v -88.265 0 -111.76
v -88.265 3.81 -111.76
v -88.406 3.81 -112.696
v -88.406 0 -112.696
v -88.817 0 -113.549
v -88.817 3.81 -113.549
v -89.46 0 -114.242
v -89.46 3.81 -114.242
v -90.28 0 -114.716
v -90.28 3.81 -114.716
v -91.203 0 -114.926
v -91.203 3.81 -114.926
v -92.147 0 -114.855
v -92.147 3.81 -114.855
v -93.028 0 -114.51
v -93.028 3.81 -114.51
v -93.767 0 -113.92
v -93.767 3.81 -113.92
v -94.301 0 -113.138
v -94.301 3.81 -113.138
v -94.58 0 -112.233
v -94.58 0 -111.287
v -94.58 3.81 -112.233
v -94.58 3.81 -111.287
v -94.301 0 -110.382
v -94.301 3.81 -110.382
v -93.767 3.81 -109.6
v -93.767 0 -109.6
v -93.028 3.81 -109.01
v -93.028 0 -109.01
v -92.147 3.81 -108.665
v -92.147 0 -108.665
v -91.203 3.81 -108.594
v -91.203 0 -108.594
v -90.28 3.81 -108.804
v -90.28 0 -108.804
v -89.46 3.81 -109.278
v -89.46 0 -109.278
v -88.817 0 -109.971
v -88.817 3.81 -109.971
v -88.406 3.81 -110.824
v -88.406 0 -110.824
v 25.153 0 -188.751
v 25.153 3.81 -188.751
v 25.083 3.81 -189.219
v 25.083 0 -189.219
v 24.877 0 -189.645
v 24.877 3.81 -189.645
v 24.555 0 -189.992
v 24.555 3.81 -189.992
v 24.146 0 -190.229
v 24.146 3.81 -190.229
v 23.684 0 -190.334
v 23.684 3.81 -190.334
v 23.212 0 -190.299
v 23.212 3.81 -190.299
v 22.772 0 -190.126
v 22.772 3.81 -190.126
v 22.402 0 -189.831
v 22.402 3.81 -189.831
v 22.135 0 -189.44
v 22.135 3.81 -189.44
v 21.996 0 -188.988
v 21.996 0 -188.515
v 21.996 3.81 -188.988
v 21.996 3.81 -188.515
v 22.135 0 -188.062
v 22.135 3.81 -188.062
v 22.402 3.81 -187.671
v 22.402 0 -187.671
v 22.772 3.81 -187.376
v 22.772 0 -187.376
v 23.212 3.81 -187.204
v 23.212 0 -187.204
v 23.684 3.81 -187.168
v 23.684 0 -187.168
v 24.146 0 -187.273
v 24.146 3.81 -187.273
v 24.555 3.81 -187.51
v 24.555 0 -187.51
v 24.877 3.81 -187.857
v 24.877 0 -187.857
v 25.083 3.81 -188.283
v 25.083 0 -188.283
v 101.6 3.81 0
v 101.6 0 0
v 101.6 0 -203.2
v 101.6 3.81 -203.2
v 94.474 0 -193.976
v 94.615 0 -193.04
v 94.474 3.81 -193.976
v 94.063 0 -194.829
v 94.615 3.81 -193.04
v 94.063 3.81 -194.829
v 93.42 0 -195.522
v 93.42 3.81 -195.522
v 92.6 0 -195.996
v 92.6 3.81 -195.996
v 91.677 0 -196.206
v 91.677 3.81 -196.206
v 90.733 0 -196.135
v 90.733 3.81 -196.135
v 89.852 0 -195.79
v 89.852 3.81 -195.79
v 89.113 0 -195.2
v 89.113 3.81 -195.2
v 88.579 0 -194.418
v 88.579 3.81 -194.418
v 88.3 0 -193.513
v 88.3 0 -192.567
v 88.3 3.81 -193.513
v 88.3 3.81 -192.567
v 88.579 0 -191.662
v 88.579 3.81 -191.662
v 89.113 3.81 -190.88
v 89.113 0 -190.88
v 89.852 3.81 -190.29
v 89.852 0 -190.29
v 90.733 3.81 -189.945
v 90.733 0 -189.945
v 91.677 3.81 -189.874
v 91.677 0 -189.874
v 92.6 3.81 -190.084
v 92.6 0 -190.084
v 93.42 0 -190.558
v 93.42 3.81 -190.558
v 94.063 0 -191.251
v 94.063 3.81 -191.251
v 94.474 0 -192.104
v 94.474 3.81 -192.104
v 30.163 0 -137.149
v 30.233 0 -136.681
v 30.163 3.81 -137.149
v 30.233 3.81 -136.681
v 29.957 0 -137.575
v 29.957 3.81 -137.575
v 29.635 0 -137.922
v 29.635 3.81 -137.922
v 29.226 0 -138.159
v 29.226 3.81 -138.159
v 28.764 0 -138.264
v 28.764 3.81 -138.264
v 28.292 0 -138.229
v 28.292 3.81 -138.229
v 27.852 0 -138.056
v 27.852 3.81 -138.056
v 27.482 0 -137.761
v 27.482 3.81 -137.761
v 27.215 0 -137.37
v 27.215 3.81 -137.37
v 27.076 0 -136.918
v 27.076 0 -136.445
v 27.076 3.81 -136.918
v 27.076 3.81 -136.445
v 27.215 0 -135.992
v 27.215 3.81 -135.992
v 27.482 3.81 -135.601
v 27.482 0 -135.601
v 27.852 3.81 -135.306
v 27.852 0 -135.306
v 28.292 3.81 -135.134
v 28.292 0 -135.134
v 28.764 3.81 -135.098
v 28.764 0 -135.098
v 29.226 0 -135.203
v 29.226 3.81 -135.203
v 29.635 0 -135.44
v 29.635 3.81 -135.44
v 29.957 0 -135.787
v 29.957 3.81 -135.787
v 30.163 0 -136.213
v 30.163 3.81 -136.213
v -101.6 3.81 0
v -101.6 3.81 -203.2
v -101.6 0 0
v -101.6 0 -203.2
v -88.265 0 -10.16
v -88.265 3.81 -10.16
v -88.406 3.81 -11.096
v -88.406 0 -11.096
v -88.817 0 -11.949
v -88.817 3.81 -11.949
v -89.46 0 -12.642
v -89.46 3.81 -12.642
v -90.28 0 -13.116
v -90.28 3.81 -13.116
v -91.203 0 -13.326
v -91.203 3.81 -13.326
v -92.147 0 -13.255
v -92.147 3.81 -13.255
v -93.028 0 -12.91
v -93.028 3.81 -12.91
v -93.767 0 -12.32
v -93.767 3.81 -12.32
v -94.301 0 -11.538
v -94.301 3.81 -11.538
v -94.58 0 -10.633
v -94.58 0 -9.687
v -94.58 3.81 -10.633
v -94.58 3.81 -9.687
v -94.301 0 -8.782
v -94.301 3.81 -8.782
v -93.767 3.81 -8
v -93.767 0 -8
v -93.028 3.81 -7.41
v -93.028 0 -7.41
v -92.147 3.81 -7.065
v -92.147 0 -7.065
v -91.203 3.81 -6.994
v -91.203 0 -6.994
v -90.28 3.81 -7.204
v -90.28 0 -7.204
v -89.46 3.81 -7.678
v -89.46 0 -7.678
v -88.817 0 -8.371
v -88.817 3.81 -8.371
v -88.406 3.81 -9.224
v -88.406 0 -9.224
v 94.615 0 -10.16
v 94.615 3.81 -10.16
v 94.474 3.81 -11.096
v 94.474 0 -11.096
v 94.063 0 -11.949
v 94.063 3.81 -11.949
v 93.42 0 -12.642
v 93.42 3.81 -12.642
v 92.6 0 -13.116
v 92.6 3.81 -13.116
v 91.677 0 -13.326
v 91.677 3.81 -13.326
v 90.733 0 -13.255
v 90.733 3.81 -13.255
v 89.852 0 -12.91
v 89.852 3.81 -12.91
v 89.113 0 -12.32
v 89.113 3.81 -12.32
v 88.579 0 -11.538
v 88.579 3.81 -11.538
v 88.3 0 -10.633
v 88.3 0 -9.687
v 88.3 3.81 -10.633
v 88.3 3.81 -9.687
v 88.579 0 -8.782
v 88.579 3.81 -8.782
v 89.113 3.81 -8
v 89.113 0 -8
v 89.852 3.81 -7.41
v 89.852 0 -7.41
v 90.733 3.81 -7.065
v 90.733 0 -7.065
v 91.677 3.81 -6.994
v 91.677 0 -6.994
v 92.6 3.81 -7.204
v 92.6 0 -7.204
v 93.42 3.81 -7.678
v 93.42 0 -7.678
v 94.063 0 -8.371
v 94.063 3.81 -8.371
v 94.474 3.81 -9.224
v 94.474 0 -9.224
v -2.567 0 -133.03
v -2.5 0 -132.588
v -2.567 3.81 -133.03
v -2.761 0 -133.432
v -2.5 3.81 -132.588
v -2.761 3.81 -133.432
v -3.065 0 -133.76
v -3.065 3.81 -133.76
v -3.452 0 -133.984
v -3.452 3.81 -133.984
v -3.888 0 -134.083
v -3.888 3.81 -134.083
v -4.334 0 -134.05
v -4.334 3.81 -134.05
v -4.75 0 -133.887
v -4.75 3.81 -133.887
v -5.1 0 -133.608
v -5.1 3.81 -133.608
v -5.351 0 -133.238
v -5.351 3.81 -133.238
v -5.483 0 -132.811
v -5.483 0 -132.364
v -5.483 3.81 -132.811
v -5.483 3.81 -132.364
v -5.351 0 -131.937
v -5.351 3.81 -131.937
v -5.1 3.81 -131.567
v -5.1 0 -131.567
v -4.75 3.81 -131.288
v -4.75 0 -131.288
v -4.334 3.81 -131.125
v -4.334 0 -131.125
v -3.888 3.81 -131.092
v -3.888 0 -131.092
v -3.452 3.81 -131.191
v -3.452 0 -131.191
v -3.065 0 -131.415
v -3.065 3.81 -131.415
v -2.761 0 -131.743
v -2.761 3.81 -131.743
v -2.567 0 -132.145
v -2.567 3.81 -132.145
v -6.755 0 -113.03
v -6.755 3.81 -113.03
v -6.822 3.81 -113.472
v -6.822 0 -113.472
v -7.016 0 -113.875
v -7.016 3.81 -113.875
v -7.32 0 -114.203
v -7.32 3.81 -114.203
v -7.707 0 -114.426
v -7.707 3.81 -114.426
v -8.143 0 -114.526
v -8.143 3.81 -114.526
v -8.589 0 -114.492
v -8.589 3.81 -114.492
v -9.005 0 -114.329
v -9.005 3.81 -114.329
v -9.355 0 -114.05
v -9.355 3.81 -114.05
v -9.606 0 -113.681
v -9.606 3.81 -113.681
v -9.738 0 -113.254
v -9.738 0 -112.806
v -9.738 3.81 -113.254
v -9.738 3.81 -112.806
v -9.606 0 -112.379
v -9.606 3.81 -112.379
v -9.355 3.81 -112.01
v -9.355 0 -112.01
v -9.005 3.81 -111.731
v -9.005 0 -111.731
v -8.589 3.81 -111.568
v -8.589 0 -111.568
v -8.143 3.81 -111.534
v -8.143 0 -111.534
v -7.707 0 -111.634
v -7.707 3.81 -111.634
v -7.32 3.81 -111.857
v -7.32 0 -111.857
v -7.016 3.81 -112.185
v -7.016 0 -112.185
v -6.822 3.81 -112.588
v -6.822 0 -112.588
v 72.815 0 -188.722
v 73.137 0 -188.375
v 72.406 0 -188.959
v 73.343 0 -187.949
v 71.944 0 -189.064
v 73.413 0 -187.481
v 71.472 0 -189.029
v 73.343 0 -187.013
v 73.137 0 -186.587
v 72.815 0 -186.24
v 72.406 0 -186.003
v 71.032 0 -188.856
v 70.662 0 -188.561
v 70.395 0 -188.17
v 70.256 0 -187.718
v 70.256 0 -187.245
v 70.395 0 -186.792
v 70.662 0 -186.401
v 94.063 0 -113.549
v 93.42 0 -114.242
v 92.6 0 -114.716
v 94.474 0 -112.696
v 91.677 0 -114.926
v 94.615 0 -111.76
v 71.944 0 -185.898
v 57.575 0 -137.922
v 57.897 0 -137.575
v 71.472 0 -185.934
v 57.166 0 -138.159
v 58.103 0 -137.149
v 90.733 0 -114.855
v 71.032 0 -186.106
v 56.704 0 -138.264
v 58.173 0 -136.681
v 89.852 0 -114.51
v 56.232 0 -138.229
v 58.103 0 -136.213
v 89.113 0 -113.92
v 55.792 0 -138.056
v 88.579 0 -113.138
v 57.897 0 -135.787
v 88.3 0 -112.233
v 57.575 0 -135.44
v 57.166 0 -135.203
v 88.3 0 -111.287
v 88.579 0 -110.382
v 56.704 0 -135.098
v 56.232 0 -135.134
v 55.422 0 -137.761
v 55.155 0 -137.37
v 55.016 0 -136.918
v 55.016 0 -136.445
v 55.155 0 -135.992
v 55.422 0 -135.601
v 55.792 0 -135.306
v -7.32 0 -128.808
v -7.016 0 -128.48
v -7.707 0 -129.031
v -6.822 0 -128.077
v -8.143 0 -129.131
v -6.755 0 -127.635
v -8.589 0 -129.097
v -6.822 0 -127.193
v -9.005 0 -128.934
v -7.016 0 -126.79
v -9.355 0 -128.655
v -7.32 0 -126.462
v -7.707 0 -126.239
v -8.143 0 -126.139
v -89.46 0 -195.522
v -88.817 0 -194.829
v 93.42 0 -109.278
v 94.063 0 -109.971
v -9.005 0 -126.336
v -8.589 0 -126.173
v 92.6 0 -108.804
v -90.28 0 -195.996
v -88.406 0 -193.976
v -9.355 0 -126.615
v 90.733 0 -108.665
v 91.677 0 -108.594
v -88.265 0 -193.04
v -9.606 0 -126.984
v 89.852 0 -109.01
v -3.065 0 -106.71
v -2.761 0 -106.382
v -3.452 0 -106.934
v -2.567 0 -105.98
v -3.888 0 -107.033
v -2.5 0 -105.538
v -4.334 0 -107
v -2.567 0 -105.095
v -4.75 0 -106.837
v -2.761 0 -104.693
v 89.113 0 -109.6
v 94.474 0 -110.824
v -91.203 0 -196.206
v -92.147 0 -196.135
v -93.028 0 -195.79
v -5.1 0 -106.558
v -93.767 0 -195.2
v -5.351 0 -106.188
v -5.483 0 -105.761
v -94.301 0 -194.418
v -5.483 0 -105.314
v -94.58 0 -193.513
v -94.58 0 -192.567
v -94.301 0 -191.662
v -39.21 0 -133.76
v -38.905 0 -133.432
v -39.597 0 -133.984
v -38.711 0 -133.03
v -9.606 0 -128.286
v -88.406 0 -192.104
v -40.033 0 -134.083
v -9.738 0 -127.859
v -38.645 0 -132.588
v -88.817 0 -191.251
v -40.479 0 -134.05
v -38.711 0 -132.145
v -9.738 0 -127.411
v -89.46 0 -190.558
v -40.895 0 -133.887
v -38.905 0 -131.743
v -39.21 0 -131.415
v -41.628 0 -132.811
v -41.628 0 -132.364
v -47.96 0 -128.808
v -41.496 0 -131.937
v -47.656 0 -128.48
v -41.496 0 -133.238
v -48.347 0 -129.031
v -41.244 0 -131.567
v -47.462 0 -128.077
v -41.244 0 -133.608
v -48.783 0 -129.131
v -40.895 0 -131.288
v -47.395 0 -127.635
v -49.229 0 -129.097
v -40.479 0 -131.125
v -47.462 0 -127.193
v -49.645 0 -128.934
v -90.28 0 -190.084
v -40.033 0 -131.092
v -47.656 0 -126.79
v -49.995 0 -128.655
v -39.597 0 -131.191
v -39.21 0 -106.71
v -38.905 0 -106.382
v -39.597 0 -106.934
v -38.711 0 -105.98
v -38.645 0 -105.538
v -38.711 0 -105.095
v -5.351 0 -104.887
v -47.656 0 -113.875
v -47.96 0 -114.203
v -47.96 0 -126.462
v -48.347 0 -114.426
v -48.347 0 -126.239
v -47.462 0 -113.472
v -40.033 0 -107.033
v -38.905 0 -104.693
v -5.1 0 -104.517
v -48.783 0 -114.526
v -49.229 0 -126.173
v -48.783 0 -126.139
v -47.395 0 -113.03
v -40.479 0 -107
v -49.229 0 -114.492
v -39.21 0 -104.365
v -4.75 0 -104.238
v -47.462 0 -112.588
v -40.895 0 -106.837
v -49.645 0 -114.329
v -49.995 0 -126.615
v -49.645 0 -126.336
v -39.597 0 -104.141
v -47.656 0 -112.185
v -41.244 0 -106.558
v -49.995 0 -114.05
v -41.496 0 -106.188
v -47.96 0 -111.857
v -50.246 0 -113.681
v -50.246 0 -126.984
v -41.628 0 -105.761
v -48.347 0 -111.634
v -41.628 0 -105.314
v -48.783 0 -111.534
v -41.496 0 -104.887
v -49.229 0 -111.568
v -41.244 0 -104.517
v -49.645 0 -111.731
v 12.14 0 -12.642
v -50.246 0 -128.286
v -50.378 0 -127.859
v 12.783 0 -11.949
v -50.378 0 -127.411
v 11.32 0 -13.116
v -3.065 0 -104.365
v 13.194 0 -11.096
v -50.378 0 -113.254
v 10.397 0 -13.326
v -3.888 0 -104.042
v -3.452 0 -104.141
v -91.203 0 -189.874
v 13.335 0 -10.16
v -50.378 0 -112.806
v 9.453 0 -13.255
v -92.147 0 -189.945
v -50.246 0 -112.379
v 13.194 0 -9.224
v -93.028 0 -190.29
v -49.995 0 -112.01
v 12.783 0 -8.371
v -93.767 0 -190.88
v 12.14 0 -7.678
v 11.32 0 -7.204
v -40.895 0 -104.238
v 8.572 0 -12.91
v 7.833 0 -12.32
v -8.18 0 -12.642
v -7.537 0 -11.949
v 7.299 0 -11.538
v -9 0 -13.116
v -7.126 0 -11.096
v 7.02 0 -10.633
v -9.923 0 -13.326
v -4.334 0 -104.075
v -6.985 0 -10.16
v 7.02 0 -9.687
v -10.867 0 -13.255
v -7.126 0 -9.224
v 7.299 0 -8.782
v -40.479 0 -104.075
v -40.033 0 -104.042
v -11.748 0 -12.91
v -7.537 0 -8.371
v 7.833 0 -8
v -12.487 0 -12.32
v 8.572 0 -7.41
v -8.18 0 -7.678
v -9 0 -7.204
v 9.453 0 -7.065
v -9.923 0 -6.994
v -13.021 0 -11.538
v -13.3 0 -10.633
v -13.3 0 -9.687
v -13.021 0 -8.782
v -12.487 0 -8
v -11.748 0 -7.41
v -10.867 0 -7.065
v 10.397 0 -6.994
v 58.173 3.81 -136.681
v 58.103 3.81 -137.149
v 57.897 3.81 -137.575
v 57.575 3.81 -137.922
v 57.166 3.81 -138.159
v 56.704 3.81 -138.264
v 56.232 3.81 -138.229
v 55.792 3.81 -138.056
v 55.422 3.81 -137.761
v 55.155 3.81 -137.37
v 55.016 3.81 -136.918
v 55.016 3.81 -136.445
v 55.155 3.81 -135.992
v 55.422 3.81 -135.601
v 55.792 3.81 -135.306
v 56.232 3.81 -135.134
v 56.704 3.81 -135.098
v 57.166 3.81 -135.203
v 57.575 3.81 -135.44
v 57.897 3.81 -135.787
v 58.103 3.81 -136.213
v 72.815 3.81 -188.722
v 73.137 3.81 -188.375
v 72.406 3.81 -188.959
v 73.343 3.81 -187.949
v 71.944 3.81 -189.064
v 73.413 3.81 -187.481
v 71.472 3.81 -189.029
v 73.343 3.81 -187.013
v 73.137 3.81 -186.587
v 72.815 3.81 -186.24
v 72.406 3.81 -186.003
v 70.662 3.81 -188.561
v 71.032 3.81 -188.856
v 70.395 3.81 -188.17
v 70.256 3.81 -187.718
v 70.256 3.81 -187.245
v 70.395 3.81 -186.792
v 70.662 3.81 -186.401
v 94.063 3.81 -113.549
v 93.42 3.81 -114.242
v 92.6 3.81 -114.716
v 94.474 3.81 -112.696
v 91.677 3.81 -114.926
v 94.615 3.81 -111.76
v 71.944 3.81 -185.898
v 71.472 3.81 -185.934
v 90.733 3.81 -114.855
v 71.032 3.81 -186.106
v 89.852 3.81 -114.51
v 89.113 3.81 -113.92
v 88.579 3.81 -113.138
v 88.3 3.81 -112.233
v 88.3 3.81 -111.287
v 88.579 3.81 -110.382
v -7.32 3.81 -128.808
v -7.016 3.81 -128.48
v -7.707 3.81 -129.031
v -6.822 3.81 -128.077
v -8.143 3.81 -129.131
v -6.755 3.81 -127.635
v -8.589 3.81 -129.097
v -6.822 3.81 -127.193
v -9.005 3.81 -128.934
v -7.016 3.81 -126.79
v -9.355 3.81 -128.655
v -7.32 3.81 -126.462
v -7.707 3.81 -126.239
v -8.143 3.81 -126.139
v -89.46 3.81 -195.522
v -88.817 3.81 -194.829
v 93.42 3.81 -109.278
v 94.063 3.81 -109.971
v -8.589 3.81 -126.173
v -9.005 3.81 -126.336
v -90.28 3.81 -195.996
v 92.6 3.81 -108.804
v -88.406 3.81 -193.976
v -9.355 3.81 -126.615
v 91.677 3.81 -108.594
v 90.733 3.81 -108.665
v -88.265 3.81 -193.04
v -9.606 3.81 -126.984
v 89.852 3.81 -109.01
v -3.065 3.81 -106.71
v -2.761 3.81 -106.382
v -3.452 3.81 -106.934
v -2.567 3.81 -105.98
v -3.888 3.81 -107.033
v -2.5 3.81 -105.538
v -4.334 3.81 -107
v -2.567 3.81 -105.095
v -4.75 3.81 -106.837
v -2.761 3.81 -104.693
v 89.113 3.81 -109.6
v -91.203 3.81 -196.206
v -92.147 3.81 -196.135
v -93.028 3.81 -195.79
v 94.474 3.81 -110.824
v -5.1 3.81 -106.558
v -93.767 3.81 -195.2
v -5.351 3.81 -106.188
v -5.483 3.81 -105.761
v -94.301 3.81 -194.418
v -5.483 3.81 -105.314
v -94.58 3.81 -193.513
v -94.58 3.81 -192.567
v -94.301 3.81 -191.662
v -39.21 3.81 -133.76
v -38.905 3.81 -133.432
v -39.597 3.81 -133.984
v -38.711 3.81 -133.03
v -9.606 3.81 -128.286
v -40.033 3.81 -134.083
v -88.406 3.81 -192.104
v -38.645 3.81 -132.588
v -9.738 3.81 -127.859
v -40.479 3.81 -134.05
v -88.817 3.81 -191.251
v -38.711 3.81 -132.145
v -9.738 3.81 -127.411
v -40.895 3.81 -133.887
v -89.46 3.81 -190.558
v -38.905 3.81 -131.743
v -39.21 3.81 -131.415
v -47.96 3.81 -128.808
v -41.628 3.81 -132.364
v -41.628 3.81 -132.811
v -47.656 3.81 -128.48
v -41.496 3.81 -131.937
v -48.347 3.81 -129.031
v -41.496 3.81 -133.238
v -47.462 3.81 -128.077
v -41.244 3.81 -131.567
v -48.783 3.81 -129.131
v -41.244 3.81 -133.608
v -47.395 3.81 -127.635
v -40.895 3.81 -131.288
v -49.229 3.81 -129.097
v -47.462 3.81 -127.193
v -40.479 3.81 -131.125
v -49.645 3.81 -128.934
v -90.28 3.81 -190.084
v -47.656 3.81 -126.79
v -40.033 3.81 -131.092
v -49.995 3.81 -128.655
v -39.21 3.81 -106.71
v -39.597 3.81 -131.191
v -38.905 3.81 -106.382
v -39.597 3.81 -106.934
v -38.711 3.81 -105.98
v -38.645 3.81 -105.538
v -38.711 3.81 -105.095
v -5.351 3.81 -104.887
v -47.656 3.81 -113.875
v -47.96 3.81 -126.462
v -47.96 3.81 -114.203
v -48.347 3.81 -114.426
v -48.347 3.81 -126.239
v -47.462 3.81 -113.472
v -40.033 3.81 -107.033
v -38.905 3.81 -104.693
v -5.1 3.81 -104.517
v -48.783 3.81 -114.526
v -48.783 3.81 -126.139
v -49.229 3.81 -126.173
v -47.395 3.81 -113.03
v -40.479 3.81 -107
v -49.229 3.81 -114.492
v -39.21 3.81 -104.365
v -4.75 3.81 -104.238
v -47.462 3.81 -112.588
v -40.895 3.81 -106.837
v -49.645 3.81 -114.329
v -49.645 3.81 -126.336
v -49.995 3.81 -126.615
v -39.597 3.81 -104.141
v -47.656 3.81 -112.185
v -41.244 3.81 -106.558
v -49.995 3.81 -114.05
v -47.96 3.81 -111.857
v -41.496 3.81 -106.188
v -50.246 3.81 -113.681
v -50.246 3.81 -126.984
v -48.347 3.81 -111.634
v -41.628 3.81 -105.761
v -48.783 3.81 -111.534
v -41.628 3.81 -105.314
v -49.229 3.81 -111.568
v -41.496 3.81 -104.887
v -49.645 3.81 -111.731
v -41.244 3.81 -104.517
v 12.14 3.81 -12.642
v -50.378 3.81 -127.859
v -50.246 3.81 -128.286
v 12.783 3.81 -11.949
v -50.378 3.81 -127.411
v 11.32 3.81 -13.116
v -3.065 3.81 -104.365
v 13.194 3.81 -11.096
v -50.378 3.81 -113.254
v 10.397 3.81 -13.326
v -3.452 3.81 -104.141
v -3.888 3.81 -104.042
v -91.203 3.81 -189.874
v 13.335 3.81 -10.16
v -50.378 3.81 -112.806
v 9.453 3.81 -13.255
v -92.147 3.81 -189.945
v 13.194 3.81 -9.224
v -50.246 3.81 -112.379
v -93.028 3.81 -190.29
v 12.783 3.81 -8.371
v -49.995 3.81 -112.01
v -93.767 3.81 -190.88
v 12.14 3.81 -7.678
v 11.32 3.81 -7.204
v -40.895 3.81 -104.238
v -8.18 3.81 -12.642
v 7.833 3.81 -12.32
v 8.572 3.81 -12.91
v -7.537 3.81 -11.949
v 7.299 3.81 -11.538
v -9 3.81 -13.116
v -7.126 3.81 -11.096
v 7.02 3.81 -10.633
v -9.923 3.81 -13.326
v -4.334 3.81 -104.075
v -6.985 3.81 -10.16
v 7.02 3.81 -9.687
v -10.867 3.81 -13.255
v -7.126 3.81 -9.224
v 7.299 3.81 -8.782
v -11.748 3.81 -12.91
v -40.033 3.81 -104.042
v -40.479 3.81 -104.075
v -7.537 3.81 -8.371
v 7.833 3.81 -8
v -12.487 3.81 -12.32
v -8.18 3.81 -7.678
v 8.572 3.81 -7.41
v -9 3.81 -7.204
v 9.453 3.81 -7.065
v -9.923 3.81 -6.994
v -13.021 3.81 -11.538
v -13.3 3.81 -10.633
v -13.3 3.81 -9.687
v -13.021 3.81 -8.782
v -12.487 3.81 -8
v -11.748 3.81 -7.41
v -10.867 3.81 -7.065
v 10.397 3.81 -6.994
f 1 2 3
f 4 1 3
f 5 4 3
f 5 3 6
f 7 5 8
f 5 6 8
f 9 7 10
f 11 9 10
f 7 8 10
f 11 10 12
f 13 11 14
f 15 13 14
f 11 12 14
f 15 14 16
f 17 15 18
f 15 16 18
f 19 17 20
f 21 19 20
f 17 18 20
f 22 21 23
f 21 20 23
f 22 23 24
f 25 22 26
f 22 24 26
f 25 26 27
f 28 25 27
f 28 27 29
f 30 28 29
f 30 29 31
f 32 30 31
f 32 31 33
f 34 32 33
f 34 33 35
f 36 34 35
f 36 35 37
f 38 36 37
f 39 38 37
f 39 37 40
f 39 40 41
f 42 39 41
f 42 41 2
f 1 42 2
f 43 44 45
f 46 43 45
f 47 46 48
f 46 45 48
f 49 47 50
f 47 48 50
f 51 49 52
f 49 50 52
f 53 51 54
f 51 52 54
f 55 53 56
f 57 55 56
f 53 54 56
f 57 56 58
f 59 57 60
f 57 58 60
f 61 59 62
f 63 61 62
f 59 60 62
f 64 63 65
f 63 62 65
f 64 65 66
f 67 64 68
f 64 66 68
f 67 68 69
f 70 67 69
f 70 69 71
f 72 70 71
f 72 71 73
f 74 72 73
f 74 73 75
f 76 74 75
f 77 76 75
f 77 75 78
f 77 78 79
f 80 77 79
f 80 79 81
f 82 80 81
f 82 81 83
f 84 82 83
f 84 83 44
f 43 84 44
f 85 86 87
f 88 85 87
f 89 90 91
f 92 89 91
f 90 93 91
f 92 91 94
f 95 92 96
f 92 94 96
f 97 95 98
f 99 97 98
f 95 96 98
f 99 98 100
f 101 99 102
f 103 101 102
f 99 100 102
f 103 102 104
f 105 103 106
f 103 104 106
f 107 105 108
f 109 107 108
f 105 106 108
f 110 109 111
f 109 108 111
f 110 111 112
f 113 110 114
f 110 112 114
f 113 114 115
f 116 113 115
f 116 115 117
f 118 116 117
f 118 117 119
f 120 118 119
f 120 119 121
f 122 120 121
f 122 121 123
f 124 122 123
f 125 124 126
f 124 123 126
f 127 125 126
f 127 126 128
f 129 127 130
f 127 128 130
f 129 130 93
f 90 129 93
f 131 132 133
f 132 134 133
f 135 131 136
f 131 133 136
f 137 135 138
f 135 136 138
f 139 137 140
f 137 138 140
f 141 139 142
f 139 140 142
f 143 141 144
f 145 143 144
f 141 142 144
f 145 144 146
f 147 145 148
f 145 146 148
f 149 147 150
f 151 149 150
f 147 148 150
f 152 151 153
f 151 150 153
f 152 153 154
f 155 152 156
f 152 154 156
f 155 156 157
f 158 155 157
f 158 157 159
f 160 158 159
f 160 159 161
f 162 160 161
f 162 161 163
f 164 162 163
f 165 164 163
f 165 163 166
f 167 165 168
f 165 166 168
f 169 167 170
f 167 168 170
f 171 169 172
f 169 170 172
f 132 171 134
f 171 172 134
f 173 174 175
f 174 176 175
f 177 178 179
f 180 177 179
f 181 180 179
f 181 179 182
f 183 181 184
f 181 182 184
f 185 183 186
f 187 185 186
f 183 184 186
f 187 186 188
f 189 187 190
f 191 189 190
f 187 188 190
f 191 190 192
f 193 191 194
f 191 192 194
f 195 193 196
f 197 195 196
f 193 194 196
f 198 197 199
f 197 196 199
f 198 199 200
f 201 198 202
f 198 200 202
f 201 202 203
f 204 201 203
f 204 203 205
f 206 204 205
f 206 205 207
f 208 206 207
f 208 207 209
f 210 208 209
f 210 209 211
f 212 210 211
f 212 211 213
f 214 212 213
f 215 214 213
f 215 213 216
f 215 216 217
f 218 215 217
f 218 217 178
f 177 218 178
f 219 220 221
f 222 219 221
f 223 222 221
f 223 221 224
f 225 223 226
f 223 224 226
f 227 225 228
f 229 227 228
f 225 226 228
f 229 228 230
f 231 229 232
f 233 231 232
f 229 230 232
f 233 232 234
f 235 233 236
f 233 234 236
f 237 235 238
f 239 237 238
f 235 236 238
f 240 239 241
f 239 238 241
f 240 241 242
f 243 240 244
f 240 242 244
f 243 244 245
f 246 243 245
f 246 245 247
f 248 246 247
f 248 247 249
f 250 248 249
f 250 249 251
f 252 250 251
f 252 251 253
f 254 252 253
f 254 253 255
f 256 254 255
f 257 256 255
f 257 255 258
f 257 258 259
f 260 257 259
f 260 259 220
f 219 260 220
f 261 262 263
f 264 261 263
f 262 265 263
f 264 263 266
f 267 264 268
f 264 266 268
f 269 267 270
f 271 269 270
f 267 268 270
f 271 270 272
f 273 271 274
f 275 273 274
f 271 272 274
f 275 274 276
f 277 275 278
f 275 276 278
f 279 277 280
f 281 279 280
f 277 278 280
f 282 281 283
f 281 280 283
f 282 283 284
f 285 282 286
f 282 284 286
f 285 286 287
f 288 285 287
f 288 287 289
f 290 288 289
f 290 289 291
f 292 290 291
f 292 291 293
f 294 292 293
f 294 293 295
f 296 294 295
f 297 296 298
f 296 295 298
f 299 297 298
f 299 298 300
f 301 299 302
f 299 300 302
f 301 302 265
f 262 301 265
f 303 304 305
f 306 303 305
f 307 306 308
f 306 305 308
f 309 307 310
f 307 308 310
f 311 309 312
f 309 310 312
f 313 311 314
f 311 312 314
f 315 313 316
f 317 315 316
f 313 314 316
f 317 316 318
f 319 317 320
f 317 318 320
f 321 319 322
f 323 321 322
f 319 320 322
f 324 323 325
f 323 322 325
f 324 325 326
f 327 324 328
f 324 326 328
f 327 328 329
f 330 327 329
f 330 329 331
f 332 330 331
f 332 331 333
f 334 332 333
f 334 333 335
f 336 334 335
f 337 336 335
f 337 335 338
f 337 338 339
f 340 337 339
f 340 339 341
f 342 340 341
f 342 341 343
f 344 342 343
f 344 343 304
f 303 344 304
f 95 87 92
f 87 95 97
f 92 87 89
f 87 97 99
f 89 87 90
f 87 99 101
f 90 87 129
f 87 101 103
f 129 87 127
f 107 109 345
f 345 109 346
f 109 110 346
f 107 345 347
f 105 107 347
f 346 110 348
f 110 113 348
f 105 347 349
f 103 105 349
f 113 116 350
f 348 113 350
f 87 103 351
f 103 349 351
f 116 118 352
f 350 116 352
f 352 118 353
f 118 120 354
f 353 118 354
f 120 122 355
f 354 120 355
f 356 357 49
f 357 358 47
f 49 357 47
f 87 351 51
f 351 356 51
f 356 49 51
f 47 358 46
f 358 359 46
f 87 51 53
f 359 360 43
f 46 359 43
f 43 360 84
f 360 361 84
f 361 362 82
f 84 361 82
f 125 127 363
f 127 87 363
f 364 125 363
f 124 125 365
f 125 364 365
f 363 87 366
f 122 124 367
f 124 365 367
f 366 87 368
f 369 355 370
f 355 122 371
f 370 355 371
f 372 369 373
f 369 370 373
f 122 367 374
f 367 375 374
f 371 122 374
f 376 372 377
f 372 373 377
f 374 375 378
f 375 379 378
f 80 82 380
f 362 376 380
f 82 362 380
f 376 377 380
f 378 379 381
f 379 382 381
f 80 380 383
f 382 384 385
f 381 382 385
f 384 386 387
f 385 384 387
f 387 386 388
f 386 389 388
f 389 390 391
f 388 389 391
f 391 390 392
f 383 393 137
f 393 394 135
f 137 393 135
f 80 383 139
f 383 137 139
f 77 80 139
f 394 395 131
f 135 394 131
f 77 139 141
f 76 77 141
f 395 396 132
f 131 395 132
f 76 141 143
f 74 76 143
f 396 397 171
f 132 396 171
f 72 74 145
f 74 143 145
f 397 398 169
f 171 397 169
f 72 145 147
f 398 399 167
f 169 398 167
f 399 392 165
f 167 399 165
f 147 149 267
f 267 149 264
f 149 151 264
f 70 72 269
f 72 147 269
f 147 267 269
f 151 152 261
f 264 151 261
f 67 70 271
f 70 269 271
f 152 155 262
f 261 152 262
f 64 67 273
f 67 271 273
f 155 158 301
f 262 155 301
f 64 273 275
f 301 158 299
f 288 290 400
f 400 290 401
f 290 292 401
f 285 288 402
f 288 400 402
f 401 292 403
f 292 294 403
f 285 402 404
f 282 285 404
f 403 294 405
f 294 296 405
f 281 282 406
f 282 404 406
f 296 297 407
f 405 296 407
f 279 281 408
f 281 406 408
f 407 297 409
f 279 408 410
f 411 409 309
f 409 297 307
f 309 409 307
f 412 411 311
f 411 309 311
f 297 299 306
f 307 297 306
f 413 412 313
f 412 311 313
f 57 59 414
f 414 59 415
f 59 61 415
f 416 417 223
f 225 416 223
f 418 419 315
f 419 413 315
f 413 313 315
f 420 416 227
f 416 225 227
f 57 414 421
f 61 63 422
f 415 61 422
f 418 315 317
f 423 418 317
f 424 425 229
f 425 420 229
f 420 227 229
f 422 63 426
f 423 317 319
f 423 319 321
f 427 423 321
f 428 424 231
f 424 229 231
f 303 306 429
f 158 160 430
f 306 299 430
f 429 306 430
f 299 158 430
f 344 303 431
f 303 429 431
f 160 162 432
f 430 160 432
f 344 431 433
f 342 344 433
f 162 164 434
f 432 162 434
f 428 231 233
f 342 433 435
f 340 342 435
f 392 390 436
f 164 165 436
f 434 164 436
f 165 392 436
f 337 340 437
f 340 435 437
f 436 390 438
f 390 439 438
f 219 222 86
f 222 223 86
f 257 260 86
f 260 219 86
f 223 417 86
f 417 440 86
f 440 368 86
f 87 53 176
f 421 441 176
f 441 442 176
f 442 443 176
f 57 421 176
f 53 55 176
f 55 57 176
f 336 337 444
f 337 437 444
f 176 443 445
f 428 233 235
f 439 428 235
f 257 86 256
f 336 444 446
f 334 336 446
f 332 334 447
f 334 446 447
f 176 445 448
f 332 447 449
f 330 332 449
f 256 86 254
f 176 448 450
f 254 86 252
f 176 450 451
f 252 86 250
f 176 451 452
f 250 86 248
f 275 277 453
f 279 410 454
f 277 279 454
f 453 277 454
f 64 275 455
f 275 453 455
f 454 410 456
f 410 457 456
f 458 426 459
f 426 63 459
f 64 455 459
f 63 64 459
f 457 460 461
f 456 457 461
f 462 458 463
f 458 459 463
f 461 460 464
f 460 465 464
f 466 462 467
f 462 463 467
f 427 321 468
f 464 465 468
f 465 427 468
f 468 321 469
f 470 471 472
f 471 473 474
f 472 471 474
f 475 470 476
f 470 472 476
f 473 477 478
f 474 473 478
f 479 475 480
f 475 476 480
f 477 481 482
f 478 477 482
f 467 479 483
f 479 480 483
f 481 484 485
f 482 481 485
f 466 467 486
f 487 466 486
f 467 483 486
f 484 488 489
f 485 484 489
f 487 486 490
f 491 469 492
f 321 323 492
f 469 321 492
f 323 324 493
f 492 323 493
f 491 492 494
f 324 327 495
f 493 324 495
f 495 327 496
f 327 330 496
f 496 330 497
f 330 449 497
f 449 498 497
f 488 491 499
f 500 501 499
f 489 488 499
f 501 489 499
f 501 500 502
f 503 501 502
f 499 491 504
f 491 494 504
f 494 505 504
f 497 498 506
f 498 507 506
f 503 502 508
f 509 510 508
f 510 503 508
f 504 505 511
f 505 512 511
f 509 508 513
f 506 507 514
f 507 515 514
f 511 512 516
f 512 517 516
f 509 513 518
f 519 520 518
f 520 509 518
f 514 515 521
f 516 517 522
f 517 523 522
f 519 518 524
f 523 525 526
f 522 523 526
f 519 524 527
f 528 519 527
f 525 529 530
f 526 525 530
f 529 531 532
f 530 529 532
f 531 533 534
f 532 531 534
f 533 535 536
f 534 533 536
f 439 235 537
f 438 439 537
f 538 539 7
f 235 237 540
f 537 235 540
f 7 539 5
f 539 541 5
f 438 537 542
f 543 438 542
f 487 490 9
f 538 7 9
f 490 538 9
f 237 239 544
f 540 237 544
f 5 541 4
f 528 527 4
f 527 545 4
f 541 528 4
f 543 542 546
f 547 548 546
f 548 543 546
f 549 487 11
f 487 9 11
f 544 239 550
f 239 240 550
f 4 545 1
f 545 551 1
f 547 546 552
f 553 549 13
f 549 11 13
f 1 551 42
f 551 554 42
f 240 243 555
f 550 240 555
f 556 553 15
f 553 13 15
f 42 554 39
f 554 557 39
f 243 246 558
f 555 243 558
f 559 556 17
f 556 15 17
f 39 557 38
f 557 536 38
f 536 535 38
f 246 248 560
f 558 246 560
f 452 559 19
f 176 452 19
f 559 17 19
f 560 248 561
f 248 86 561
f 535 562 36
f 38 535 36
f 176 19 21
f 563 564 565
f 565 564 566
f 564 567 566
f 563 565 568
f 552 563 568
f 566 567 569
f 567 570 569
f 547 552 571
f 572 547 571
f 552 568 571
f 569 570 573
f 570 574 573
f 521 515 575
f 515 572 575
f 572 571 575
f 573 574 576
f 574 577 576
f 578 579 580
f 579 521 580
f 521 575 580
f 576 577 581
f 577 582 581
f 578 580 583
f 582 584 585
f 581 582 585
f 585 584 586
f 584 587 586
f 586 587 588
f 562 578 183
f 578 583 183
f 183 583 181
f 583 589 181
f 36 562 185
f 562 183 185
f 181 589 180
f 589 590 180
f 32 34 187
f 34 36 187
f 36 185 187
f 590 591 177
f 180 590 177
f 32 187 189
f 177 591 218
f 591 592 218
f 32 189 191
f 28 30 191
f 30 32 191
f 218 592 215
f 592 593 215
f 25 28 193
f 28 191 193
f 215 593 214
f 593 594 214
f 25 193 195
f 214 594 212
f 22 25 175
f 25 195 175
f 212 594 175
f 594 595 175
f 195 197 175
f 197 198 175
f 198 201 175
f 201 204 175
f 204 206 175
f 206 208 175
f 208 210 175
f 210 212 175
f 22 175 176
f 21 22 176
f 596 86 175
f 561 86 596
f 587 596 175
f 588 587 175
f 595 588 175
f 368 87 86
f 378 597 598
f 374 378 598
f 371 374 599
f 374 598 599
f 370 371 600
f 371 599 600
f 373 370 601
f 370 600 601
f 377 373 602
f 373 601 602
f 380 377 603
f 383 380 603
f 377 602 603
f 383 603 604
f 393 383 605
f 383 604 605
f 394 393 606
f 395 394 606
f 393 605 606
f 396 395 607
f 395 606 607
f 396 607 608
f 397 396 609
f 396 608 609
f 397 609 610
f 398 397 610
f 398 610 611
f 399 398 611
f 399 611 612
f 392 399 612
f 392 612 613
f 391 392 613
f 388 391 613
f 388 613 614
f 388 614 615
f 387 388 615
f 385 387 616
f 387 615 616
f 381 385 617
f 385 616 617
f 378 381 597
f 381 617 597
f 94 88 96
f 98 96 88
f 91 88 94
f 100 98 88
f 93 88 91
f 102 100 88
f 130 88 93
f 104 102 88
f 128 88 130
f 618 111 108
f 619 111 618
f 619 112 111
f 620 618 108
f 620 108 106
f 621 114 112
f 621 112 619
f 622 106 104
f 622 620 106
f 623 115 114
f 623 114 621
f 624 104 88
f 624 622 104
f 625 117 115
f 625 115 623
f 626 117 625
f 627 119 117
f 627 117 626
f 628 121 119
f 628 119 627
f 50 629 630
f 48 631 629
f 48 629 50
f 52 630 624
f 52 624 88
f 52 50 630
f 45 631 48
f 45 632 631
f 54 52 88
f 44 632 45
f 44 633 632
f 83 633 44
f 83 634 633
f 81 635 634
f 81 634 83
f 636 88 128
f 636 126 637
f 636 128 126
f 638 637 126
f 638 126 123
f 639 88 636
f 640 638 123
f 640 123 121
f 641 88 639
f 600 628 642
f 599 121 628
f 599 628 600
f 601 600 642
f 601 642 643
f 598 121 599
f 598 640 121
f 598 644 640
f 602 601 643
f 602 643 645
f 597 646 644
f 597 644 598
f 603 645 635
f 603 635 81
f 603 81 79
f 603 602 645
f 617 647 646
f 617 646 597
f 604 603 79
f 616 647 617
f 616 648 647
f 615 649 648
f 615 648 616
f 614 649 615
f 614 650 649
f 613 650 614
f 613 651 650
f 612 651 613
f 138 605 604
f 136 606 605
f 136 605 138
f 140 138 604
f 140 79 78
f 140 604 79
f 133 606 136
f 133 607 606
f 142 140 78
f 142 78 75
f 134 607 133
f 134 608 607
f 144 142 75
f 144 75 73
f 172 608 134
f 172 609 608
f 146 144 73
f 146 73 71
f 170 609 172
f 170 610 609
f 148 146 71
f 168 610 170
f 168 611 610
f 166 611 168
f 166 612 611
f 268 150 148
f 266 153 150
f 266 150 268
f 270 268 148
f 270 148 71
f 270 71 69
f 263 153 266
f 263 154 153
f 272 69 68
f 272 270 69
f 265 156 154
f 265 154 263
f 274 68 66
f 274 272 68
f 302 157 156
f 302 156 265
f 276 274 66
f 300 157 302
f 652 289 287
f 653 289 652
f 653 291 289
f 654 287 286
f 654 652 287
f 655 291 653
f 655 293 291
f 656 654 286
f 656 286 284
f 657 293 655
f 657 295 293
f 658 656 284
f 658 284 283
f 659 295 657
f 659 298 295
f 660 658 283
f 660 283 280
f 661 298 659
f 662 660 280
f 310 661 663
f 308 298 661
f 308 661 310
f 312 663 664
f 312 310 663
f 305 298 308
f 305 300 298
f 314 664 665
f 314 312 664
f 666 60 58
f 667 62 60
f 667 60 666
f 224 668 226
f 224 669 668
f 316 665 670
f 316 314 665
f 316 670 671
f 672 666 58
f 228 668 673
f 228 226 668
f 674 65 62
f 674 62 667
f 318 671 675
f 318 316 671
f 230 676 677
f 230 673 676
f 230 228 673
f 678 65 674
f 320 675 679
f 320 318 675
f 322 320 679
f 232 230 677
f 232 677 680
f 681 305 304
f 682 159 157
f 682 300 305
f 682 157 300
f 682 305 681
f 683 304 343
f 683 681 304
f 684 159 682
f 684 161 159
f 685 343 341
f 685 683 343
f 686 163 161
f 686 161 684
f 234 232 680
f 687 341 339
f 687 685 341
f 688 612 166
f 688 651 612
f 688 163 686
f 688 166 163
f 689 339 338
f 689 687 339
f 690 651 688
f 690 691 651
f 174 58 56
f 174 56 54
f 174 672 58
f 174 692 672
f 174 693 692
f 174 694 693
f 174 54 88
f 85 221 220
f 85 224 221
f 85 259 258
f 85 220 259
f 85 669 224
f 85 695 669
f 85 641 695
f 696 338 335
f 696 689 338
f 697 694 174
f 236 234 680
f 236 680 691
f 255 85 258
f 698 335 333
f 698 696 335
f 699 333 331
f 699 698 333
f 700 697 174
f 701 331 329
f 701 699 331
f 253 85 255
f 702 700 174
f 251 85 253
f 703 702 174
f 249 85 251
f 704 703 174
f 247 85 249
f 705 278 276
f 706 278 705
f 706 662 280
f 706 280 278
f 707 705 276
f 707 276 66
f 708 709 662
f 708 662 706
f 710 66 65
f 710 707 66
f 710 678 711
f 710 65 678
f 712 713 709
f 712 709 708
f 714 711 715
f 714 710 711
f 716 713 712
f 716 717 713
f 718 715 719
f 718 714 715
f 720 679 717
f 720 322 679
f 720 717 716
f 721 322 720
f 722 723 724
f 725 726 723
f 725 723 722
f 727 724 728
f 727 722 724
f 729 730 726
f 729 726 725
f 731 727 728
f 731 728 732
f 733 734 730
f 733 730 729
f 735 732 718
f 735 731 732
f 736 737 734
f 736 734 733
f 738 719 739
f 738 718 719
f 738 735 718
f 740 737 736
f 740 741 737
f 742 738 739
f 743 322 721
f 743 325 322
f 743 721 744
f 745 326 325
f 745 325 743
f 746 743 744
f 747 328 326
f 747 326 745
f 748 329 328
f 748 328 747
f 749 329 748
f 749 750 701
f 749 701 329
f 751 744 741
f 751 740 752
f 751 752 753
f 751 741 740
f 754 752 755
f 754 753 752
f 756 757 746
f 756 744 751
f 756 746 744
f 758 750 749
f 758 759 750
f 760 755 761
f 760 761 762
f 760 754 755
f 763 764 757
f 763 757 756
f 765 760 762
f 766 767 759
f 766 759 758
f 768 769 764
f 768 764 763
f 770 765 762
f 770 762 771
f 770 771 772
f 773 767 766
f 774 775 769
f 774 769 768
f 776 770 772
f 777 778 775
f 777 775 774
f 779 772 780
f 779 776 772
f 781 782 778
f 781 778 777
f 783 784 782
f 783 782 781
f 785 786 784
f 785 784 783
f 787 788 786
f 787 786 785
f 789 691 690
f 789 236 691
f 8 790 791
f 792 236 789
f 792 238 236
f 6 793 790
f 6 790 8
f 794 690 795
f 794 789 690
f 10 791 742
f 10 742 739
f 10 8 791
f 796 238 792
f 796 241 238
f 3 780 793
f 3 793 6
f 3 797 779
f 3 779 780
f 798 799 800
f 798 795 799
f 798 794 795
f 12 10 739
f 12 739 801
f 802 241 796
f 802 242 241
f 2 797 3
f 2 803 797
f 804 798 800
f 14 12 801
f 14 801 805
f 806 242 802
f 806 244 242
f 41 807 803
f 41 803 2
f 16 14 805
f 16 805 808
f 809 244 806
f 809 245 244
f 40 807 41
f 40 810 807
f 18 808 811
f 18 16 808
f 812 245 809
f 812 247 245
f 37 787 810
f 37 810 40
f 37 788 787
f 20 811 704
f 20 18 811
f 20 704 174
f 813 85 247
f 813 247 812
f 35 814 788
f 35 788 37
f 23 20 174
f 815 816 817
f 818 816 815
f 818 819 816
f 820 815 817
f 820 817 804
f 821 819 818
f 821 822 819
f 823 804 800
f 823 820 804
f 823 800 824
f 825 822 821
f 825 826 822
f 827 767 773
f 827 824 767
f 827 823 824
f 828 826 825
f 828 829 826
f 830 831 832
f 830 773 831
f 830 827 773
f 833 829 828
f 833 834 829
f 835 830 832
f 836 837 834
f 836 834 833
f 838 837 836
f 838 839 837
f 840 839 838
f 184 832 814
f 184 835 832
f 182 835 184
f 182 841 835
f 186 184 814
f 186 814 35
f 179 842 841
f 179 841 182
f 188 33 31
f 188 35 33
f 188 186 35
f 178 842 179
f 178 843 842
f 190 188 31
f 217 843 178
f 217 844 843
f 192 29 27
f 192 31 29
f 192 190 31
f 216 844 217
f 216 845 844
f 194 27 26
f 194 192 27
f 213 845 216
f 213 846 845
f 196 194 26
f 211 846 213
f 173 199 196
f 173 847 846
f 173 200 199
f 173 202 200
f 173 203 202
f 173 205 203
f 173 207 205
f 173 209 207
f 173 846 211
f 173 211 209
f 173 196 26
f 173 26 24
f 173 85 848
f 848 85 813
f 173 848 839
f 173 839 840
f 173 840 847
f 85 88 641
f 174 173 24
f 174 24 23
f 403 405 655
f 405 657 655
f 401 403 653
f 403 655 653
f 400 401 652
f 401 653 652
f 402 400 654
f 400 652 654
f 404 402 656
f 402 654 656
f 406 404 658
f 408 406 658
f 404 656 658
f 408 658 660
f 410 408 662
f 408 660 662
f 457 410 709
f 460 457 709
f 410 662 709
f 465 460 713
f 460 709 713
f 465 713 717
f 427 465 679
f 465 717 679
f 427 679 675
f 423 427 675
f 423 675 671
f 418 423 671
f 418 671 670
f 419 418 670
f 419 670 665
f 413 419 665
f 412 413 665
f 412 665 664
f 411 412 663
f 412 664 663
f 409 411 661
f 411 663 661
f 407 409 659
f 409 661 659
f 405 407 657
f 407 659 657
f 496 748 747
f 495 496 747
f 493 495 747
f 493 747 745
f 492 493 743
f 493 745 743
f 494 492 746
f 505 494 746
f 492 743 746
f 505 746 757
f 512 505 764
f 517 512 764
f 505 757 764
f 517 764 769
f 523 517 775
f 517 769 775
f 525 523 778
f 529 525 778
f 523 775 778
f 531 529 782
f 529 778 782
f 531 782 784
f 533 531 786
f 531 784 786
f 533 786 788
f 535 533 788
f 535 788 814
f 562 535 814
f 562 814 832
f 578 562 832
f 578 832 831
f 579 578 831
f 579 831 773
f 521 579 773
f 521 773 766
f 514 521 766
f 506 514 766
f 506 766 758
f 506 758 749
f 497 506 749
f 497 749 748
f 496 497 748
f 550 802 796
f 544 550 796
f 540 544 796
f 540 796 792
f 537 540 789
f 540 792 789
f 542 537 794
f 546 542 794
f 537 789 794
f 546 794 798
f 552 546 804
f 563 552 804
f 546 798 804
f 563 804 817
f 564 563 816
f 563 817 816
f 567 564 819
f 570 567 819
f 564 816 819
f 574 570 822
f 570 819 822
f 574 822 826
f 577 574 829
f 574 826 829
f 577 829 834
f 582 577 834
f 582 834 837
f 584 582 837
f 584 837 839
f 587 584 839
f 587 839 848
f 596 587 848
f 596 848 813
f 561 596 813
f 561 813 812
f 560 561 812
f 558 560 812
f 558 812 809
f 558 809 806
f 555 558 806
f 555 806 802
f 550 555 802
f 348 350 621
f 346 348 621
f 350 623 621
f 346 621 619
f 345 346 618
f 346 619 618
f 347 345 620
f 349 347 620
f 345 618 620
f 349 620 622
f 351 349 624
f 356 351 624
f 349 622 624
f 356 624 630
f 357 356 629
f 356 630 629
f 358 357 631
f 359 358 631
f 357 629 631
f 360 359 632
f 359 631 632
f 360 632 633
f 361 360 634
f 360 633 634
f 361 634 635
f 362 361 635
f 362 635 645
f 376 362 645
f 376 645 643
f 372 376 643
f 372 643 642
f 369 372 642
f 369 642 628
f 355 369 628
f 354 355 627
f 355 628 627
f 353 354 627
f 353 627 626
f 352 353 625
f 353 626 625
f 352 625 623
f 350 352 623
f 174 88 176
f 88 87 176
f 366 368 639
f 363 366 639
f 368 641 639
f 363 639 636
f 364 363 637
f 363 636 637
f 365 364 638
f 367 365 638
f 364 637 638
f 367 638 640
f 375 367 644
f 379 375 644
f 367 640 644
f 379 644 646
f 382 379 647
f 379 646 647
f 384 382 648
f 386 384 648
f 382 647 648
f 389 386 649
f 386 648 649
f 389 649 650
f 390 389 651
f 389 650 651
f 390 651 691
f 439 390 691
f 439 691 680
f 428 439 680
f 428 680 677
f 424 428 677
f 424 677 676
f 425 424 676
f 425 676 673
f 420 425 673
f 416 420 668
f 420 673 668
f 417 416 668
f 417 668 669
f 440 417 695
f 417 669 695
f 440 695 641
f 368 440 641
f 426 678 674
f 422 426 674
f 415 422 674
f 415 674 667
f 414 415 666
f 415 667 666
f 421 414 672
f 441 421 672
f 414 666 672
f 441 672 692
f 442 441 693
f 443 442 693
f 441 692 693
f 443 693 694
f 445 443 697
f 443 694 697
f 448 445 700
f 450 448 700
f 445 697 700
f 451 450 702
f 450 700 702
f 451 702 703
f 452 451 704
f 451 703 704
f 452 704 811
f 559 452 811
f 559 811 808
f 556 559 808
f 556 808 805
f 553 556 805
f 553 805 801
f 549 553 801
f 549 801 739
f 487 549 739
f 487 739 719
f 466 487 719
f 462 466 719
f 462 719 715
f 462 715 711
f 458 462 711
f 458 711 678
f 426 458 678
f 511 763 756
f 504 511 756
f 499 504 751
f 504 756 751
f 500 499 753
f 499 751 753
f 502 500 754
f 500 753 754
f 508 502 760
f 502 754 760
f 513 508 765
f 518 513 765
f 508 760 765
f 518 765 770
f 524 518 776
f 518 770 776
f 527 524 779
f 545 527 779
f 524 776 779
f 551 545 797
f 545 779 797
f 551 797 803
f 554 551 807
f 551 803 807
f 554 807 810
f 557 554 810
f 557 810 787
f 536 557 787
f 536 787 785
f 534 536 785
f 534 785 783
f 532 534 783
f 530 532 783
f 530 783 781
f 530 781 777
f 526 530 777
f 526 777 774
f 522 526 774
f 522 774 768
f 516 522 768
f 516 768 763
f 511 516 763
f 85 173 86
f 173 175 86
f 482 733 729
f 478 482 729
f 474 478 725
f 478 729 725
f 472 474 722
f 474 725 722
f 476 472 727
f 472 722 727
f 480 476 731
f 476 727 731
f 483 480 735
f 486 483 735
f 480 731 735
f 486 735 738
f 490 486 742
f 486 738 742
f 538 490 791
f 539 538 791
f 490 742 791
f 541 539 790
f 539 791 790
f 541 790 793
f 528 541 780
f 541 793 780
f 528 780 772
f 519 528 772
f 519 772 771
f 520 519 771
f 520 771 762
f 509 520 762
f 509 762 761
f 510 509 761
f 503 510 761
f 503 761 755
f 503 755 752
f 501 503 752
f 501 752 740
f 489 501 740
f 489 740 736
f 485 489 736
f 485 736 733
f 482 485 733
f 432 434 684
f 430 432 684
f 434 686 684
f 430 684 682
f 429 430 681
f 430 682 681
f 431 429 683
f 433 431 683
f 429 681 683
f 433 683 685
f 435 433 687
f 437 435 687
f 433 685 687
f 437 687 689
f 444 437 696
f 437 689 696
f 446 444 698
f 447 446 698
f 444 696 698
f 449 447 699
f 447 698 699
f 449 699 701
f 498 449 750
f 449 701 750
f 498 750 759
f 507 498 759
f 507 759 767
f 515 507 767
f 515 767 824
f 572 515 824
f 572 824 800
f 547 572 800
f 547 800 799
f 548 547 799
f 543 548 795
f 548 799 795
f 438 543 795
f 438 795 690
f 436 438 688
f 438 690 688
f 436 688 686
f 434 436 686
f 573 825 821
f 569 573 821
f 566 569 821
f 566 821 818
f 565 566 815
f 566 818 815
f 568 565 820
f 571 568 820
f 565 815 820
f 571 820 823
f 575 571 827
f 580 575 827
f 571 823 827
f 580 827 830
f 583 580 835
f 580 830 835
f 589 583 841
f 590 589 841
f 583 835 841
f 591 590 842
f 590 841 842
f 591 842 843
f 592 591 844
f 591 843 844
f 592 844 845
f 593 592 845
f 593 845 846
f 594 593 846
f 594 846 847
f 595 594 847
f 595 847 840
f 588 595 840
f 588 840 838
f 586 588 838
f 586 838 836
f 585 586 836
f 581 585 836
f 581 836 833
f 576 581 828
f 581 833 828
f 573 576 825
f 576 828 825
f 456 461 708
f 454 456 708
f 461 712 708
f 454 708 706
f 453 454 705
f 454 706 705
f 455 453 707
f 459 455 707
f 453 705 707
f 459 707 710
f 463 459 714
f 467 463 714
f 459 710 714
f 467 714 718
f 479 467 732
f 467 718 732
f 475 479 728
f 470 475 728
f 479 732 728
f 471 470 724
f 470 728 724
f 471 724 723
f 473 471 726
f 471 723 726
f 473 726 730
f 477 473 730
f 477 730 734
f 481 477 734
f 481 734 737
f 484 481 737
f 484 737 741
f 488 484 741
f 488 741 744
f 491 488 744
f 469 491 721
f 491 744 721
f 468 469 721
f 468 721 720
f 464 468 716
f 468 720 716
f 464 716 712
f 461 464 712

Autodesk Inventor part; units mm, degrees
ref_plane "YZ Plane" through (0, 0, 0) normal (1, 0, 0) x (0, 1, 0)
ref_plane "XZ Plane" through (0, 0, 0) normal (0, 1, 0) x (-1, 0, 0)
ref_plane "XY Plane" through (0, 0, 0) normal (0, 0, 1) x (1, 0, 0)
sketch "Sketch1" plane through (0, 0, 0) normal (0, 1, 0) x (-1, 0, 0)
  line L0 (101.6, 0) -> (-101.6, 0)
  line L1 (-101.6, 0) -> (-101.6, -203.2)
  line L2 (-101.6, -203.2) -> (101.6, -203.2)
  line L3 (101.6, -203.2) -> (101.6, 0)
  dimension "d0" = 203.2
  dimension "d1" = 203.2
extrude "Extrusion1" add sketch "Sketch1" along normal blind 3.81
sketch "Sketch2" plane through (0, 3.81, 0) normal (0, 1, 0) x (1, 0, 0)
  circle A0 centre (-91.44, 10.16) radius 10.16
  circle A1 centre (-91.44, 10.16) radius 3.175
  line L0 (-101.6, 203.2) -> (-101.6, 0) projected
  line L1 (-101.6, 101.6) -> (101.6, 101.6)
  line L2 (101.6, 0) -> (101.6, 203.2) projected
  line L3 (-101.6, 0) -> (101.6, 0) projected
  line L4 (0, 0) -> (0, 101.6)
  circle A2 centre (91.44, 10.16) radius 10.16
  circle A3 centre (91.44, 10.16) radius 3.175
  circle A4 centre (-91.44, 193.04) radius 10.16
  circle A5 centre (-91.44, 193.04) radius 3.175
  circle A6 centre (91.44, 193.04) radius 10.16
  circle A7 centre (91.44, 193.04) radius 3.175
  point P0 (0, 0)
  dimension "d4" = 20.32
  dimension "d5" = 6.35
extrude "Extrusion2" cut sketch "Sketch2" against normal blind 3.81 contours A1 | A3 | A5 | A7
sketch "Sketch3" plane through (0, 3.81, 0) normal (0, 1, 0) x (1, 0, 0)
  line L0 (101.6, 0) -> (101.6, 203.2) projected
  line L1 (101.6, 101.6) -> (-101.6, 101.6)
  line L2 (-101.6, 203.2) -> (-101.6, 0) projected
  circle A0 centre (-91.44, 111.76) radius 10.16
  circle A1 centre (-91.44, 111.76) radius 3.175
  circle A2 centre (91.44, 111.76) radius 10.16
  circle A3 centre (91.44, 111.76) radius 3.175
  point P0 (-100.0125, 103.1875)
  dimension "d8" = 20.32
  dimension "d9" = 6.35
  dimension "d10" = 20.32
  dimension "d11" = 6.35
extrude "Extrusion3" cut sketch "Sketch3" against normal blind 3.81 contours A1 | A3
sketch "Sketch4" plane through (0, 3.81, 0) normal (0, 1, 0) x (1, 0, 0)
  circle A0 centre (-48.895, 113.03) radius 1.5
  circle A1 centre (-48.895, 113.03) radius 1.5
  circle A2 centre (-8.255, 113.03) radius 1.5
  circle A3 centre (-8.255, 113.03) radius 1.5
  line L0 (-3.175, 107.95) -> (-13.335, 107.95)
  line L1 (-53.975, 130.175) -> (-53.975, 107.95)
  line L2 (-3.175, 107.95) -> (-53.975, 107.95)
  line L3 (-53.975, 107.95) -> (-53.975, 132.715)
  line L4 (-53.975, 132.715) -> (-3.175, 132.715)
  line L5 (-3.175, 132.715) -> (-3.175, 107.95)
  line L6 (-101.6, 203.2) -> (-101.6, 0) projected
  line L7 (101.6, 0) -> (101.6, 203.2) projected
  line L8 (-101.6, 0) -> (101.6, 0)
  line L9 (101.6, 0) -> (101.6, 107.95)
  line L10 (101.6, 107.95) -> (-101.6, 107.95)
  line L11 (-101.6, 107.95) -> (-101.6, 0)
  line L12 (-53.975, 120.3325) -> (-3.175, 120.3325)
  circle A4 centre (-48.895, 127.635) radius 1.5
  circle A5 centre (-48.895, 127.635) radius 1.5
  circle A6 centre (-8.255, 127.635) radius 1.5
  circle A7 centre (-8.255, 127.635) radius 1.5
  line L13 (-48.895, 107.95) -> (-48.895, 113.03)
  line L14 (-8.255, 107.95) -> (-8.255, 113.03)
  line L15 (-8.255, 132.715) -> (-8.255, 127.635)
  line L16 (-48.895, 132.715) -> (-48.895, 127.635)
  dimension "d14" = 107.95
extrude "Extrusion4" cut sketch "Sketch4" against normal blind 3.81 contours A0 | A2 | A6 | A4
sketch "Sketch5" plane through (0, 3.81, 0) normal (0, 1, 0) x (1, 0, 0)
  circle A0 centre (10.16, 10.16) radius 10.16
  circle A1 centre (10.16, 10.16) radius 3.175
  line L0 (-101.6, 0) -> (101.6, 0) projected
  line L1 (101.6, 203.2) -> (-101.6, 203.2) projected
  line L2 (0, 203.2) -> (0, 150.8125)
  circle A2 centre (-10.16, 10.16) radius 10.16
  circle A3 centre (-10.16, 10.16) radius 3.175
  dimension "d17" = 20.32
  dimension "d18" = 6.35
extrude "Extrusion5" cut sketch "Sketch5" against normal blind 3.81 contours A1 | A3
sketch "Sketch6" plane through (0, 3.81, 0) normal (0, 1, 0) x (1, 0, 0)
  line L0 (-44.1448, 101.6) -> (0, 101.6)
  line L1 (0, 101.6) -> (0, 136.525)
  line L2 (0, 136.525) -> (-44.1448, 136.525)
  line L3 (-44.1448, 136.525) -> (-44.1448, 101.6)
  circle A0 centre (-40.1448, 132.5875) radius 1.5
  circle A1 centre (-40.1448, 132.5875) radius 1.5
  circle A2 centre (-40.1448, 105.5375) radius 1.5
  circle A3 centre (-40.1448, 105.5375) radius 1.5
  circle A4 centre (-4, 105.5375) radius 1.5
  circle A5 centre (-4, 105.5375) radius 1.5
  circle A6 centre (-4, 132.5875) radius 1.5
  circle A7 centre (-4, 132.5875) radius 1.5
  line L4 (-101.6, 203.2) -> (-101.6, 0) projected
  line L5 (-101.6, 101.6) -> (101.6, 101.6)
  line L6 (101.6, 0) -> (101.6, 203.2) projected
extrude "Extrusion6" cut sketch "Sketch6" against normal blind 3.81 contours A0 | A2 | A4 | A6
sketch "Sketch7" plane through (0, 3.81, 0) normal (0, 1, 0) x (1, 0, 0)
  circle A0 centre (2.54, 15.24) radius 1.5875
  circle A1 centre (2.54, 15.24) radius 1.5875
  circle A2 centre (50.8, 13.97) radius 1.5875
  circle A3 centre (45.72, 66.04) radius 1.5875
  circle A4 centre (17.78, 66.04) radius 1.5875
  circle A5 centre (50.8, 13.97) radius 1.5875
  line L0 (50.8, 13.97) -> (50.8, 0)
  line L1 (0, 0) -> (53.34, 0)
  line L2 (50.8, 0) -> (53.34, 0)
  line L3 (53.34, 0) -> (53.34, 66.04)
  line L4 (53.34, 66.04) -> (53.34, 68.58)
  line L5 (53.34, 68.58) -> (0, 68.58)
  line L6 (0, 68.58) -> (0, 0)
  line L7 (0, 0) -> (53.34, 0)
  line L8 (2.54, 15.24) -> (0, 15.24)
  line L9 (0, 66.04) -> (0, 0)
  circle A6 centre (17.78, 66.04) radius 1.5875
  line L10 (17.78, 66.04) -> (17.78, 68.58)
  line L11 (45.72, 66.04) -> (45.72, 68.58)
  line L12 (23.5657, 188.7512) -> (23.5657, 202.7212)
  circle A7 centre (23.5657, 188.7512) radius 1.5875
  line L13 (23.5657, 202.7212) -> (21.0257, 202.7212)
  line L14 (74.3657, 202.7212) -> (21.0257, 202.7212)
  line L15 (74.3657, 202.7212) -> (21.0257, 202.7212)
  line L16 (74.3657, 136.6812) -> (74.3657, 202.7212)
  line L17 (74.3657, 134.1412) -> (74.3657, 202.7212)
  line L18 (21.0257, 202.7212) -> (21.0257, 136.6812)
  circle A8 centre (56.5857, 136.6812) radius 1.5875
  circle A9 centre (56.5857, 136.6812) radius 1.5875
  line L19 (56.5857, 136.6812) -> (56.5857, 134.1412)
  line L20 (21.0257, 134.1412) -> (74.3657, 134.1412)
  line L21 (28.6457, 136.6812) -> (28.6457, 134.1412)
  circle A10 centre (28.6457, 136.6812) radius 1.5875
  line L22 (21.0257, 136.6812) -> (21.0257, 134.1412)
  circle A11 centre (71.8257, 187.4812) radius 1.5875
  circle A12 centre (71.8257, 187.4812) radius 1.5875
  line L23 (71.8257, 187.4812) -> (74.3657, 187.4812)
  circle A13 centre (23.5657, 188.7512) radius 1.5875
  point P0 (71.8257, 187.4812)
extrude "Extrusion7" cut sketch "Sketch7" against normal blind 3.81 contours A10 | A8 | A11 | A7
properties part number "grounplate" material "Wood (Birch)"
